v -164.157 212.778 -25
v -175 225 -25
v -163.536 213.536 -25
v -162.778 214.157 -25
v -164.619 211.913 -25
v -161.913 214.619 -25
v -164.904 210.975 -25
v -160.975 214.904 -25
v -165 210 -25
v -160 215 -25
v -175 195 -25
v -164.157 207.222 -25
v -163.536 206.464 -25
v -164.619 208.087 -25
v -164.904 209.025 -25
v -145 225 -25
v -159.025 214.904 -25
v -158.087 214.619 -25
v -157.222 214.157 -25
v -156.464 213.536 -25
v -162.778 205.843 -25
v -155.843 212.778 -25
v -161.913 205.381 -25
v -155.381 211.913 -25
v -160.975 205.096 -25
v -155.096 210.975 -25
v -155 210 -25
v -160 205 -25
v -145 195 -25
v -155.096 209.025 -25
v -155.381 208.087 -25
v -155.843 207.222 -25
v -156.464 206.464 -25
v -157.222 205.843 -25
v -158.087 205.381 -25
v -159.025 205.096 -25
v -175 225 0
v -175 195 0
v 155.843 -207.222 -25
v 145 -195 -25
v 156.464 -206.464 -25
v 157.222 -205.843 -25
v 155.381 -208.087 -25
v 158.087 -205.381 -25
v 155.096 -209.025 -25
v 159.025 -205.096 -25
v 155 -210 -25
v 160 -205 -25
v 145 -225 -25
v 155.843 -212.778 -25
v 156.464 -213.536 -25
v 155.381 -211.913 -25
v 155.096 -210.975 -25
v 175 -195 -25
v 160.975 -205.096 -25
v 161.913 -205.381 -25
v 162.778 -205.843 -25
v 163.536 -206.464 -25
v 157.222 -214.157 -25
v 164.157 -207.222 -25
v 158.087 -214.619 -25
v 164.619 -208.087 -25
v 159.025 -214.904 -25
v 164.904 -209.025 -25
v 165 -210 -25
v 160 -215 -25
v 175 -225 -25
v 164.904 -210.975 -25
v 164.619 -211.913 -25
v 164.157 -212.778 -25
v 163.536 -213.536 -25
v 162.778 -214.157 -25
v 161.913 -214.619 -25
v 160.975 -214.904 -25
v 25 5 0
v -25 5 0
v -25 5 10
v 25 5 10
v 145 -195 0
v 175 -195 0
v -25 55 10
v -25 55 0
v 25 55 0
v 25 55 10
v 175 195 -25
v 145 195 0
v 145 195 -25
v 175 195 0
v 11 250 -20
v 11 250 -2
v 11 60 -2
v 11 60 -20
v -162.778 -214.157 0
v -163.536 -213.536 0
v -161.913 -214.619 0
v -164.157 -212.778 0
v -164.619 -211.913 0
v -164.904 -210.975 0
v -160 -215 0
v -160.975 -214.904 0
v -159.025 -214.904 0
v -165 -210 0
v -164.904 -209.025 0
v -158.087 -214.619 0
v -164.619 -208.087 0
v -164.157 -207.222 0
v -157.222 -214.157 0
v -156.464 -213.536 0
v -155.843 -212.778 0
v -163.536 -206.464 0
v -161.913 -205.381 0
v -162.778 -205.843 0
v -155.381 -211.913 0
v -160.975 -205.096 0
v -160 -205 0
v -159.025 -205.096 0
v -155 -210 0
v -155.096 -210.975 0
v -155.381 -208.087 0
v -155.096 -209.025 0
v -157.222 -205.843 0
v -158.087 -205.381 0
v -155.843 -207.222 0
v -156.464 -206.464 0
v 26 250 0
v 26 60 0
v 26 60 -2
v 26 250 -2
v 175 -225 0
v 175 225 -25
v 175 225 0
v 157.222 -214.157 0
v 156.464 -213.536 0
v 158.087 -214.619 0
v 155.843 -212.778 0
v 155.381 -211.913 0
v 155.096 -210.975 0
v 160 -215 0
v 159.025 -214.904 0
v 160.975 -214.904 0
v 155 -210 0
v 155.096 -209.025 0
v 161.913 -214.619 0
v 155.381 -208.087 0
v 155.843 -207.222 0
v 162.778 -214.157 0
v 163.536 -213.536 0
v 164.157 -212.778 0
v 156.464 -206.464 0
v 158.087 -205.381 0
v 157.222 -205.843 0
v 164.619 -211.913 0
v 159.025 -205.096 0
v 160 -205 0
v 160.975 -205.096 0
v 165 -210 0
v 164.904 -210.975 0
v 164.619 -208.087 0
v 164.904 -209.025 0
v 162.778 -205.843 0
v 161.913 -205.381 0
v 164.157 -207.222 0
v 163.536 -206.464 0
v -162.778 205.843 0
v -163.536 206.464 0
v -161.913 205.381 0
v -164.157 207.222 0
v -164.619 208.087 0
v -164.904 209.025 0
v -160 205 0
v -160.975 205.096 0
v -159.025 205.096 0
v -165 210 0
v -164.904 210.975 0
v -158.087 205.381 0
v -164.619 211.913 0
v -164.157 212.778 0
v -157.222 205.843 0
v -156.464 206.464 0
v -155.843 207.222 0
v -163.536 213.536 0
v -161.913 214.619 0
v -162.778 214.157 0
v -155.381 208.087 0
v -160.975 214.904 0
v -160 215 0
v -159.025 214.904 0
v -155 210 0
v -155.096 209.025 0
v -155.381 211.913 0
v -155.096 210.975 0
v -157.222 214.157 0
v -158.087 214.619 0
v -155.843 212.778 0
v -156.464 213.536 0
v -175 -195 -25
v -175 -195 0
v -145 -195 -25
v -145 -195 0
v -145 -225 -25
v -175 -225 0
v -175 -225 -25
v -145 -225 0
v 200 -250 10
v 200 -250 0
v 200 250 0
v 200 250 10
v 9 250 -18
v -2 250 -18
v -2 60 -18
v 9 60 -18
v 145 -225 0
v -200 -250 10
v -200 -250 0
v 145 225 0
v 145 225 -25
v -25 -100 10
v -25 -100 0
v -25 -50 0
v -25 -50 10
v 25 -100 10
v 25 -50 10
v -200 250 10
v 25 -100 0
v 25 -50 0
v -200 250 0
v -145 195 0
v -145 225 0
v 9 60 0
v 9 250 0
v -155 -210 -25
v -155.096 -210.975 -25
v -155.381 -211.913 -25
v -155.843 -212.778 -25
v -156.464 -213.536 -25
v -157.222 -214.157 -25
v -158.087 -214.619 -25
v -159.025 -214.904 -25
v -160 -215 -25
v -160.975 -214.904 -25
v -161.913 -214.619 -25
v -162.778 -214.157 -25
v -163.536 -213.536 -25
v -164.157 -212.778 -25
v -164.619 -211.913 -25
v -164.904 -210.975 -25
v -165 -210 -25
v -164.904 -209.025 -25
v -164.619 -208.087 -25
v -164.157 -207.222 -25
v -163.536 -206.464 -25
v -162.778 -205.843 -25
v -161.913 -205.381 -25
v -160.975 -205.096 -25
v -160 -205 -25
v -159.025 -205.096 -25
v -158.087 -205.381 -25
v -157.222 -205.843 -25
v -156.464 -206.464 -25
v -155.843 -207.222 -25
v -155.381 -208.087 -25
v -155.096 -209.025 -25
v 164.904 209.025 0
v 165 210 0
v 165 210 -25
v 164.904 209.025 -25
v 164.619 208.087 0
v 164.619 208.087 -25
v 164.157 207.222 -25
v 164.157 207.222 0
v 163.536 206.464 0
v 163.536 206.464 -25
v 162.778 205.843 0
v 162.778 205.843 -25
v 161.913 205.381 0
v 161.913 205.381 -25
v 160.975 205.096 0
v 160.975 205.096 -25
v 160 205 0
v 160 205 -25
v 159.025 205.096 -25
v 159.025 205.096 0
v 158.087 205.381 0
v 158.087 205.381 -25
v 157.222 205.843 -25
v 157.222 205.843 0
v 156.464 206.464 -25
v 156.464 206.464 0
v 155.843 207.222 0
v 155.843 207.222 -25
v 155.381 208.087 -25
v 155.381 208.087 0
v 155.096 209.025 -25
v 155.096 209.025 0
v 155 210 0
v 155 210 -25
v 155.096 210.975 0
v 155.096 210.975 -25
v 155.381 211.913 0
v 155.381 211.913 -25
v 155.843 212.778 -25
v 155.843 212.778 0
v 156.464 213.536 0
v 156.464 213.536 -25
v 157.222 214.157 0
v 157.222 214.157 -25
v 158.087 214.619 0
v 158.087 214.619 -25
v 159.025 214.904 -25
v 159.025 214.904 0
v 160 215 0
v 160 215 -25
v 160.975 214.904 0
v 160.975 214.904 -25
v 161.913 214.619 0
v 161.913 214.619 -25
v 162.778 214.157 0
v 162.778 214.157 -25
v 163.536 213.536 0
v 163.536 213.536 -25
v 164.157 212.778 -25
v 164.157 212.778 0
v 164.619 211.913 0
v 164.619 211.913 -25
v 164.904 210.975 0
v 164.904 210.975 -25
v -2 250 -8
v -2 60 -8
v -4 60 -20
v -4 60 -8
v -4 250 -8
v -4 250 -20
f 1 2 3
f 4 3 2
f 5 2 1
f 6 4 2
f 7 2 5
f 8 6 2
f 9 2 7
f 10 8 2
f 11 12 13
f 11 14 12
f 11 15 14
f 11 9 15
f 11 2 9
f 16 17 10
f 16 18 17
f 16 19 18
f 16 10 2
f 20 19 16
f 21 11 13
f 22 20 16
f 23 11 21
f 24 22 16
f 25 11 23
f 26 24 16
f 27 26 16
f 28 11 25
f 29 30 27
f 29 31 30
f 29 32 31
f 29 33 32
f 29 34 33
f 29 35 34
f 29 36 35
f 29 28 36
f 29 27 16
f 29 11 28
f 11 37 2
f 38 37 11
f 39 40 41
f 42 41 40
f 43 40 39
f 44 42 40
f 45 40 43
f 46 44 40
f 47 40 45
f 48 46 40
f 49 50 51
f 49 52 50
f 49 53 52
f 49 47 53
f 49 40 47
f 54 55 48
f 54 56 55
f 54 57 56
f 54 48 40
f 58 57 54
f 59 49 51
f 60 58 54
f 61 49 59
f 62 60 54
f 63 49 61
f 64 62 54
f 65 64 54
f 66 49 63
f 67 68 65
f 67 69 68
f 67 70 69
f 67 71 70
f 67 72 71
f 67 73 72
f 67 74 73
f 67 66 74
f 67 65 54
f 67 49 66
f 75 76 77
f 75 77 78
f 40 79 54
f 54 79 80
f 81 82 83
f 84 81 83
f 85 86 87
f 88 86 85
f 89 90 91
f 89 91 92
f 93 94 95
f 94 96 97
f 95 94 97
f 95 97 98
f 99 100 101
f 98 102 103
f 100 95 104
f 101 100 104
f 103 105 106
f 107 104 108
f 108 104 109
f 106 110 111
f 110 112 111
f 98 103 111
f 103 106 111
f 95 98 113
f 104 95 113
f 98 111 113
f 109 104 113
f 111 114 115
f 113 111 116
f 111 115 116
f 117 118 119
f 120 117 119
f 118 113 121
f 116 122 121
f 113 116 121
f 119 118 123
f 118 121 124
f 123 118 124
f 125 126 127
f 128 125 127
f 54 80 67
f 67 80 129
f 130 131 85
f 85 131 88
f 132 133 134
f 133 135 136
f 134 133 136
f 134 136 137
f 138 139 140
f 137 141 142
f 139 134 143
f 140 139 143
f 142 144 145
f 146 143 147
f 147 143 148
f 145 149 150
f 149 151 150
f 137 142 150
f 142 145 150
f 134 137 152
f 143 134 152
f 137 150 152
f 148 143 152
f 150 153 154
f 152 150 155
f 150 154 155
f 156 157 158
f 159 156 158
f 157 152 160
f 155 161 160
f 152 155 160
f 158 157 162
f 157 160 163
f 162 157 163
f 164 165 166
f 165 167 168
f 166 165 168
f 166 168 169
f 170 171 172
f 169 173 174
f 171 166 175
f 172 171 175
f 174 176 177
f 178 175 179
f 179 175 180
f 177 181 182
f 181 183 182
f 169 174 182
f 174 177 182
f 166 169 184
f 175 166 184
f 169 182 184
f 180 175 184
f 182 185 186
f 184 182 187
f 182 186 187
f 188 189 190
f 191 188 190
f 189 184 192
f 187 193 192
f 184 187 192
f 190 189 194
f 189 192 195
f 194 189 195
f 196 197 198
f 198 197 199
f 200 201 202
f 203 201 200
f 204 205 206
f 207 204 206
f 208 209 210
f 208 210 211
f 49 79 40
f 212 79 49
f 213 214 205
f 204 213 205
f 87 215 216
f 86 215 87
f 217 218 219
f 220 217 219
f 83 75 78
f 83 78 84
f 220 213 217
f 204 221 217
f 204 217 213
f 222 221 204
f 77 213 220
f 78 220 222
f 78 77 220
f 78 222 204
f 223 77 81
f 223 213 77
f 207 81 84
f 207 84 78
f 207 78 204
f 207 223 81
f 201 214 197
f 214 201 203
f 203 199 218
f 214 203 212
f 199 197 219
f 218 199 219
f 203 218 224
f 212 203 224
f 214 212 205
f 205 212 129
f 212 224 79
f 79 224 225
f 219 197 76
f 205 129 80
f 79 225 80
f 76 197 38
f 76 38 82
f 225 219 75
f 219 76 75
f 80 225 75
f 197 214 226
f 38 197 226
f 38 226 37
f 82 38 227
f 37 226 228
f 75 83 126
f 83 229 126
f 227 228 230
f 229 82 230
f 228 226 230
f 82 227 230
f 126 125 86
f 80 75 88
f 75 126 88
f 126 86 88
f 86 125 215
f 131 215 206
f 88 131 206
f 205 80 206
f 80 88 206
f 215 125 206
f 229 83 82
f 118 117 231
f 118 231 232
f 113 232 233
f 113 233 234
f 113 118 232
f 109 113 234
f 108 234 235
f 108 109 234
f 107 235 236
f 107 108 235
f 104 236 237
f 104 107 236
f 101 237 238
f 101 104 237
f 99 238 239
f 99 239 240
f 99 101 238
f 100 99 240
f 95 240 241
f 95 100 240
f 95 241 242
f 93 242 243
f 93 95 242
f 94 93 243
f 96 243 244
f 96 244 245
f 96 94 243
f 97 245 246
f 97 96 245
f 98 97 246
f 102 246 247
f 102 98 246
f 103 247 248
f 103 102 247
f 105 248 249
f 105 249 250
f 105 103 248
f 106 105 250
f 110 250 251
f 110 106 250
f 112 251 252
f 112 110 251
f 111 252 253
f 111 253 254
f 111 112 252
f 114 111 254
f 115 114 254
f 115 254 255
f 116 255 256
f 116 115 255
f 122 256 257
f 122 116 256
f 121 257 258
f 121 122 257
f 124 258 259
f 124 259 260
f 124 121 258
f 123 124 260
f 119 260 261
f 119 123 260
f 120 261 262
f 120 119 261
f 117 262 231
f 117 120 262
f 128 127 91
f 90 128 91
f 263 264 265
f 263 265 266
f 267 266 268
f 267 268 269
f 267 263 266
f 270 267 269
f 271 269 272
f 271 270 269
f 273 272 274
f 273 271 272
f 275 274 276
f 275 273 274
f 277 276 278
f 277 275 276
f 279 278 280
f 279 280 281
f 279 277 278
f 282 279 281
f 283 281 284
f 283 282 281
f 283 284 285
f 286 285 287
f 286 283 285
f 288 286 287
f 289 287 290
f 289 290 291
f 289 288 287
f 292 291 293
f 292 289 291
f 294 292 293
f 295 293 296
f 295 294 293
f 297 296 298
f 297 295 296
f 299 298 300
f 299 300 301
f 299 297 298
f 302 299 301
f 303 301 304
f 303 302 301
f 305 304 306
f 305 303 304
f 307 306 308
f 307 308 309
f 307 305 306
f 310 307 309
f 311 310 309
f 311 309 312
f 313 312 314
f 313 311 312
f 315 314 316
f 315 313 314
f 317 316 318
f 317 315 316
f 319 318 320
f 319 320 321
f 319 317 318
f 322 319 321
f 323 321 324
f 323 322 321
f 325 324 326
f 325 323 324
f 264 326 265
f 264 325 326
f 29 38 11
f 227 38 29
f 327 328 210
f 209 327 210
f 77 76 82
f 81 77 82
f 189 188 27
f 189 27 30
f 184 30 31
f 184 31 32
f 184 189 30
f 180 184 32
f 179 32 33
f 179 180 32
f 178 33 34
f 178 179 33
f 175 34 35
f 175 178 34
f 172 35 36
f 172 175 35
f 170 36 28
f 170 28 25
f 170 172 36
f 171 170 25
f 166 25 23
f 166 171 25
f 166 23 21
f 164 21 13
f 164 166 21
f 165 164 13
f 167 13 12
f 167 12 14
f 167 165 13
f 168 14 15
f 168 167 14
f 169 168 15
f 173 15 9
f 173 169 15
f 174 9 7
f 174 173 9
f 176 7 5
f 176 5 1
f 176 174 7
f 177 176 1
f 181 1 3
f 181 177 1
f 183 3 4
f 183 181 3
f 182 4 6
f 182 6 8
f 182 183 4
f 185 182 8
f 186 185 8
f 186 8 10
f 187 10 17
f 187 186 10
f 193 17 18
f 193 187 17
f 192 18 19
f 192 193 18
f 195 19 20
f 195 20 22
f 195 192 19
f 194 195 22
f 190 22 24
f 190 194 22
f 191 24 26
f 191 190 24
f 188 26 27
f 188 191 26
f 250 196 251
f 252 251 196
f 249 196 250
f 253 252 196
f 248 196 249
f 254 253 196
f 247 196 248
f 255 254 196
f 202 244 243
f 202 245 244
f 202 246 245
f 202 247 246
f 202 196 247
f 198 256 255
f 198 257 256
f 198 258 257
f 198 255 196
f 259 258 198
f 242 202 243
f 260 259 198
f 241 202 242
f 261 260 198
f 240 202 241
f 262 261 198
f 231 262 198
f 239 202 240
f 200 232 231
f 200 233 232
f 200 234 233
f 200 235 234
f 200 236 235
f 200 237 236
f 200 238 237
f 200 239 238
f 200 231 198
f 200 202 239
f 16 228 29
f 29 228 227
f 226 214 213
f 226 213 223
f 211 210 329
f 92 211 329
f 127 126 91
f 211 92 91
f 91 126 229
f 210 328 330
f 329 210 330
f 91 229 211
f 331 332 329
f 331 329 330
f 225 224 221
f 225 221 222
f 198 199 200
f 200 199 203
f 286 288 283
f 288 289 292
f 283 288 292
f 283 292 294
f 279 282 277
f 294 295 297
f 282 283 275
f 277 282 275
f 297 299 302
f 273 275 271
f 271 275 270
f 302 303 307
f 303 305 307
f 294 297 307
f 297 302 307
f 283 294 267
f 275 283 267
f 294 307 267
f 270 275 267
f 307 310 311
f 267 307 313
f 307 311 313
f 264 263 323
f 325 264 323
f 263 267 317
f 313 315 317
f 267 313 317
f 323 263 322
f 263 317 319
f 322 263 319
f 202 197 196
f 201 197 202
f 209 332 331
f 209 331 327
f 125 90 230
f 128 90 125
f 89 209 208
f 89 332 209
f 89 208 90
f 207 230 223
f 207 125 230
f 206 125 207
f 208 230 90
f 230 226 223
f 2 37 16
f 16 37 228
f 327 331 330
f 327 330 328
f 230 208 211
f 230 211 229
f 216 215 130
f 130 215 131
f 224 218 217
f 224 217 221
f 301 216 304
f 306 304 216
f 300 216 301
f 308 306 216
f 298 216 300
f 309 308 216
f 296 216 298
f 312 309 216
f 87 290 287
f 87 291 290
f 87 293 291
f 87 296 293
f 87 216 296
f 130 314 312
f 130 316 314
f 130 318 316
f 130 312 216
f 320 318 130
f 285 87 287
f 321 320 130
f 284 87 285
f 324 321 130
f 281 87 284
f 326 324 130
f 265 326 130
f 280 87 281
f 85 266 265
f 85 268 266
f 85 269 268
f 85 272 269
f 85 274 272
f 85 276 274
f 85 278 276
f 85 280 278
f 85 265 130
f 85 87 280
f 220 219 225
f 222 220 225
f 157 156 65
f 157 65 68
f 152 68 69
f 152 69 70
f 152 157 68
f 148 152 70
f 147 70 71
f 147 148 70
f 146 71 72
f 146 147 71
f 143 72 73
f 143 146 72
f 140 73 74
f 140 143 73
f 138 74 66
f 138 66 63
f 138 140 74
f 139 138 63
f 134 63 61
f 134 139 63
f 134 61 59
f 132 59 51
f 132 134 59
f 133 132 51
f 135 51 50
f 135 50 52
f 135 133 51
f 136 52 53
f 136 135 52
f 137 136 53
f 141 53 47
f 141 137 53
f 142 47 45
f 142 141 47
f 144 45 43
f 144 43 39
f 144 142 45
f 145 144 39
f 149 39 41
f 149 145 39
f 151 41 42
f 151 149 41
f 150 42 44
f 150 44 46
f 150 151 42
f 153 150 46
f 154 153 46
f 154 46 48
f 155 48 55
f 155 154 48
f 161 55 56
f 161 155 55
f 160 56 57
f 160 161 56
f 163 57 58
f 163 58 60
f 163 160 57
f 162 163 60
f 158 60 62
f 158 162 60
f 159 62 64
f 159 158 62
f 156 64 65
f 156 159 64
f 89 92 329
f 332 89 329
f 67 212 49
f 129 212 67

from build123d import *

# Parameters (mm, degrees)
F0_W     = 400
F0_H     = 500
F0_W_2   = 50
F0_H_2   = 50
F1_DEPTH = 10
F2_W     = 30
F2_H     = 30
F2_R     = 5
F3_DEPTH = 25
F5_DEPTH = 190


with BuildPart() as f1:
    # F0 (on Top) → F1 (new body)
    with BuildSketch(Plane.XY):
        Rectangle(F0_W, F0_H)
        with Locations((0, -75)):
            Rectangle(F0_W_2, F0_H_2, mode=Mode.SUBTRACT)
        with Locations((0, 30)):
            Rectangle(F0_W_2, F0_H_2, mode=Mode.SUBTRACT)
    extrude(amount=F1_DEPTH)

    # F2 (on face) → F3 (join)
    with BuildSketch(Plane(origin=(0, 0, 0), x_dir=(1, 0, 0), z_dir=(0, 0, -1))):
        with Locations((160, 210)):
            Rectangle(F2_W, F2_H)
        with Locations((160, 210)):
            Circle(F2_R, mode=Mode.SUBTRACT)
        with Locations((160, -210)):
            Rectangle(F2_W, F2_H)
        with Locations((160, -210)):
            Circle(F2_R, mode=Mode.SUBTRACT)
        with Locations((-160, -210)):
            Rectangle(F2_W, F2_H)
        with Locations((-160, -210)):
            Circle(F2_R, mode=Mode.SUBTRACT)
        with Locations((-160, 210)):
            Rectangle(F2_W, F2_H)
        with Locations((-160, 210)):
            Circle(F2_R, mode=Mode.SUBTRACT)
    extrude(amount=F3_DEPTH)

    # F4 (on face) → F5 (join)
    with BuildSketch(Plane(origin=(0, 250, 0), x_dir=(-1, 0, 0), z_dir=(0, 1, 0))):
        Polygon((4, -20), (4, -8), (2, -8), (2, -18), (-9, -18), (-9, 0), (-26, 0), (-26, -2), (-11, -2), (-11, -20), align=None)
    extrude(amount=-F5_DEPTH)


solid = f1.part
